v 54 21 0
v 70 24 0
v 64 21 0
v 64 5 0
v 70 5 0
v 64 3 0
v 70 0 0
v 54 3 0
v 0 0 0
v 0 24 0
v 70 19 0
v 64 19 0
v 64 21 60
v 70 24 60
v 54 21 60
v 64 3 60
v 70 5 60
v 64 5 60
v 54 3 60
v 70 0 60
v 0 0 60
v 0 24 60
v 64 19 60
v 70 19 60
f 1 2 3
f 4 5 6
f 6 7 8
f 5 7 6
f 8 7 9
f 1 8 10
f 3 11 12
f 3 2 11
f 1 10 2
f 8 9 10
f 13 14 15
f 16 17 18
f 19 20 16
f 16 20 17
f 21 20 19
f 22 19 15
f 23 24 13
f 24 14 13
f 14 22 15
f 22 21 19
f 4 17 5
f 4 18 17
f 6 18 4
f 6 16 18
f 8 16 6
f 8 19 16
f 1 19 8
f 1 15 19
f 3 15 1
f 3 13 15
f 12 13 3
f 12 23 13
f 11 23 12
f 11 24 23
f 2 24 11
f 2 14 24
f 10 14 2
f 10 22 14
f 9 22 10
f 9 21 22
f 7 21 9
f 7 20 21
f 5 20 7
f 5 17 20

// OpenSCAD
$fn = 32;

// ----------------------------------------------------------------------
// T-slot rail: 70 x 24 mm section, 60 mm long
// ----------------------------------------------------------------------

// --- parameters (mm) ---
profile_height = 60;      // extrusion height
profile_points = 12;      // points of the closed outline

profile = [[0, 0], [70, 0], [70, 5], [64, 5], [64, 3], [54, 3], [54, 21], [64, 21], [64, 19], [70, 19], [70, 24], [0, 24]];  // single closed polygon, 12 points, counter clockwise

// --- the one profile operation ---
linear_extrude(height = profile_height) polygon(points = profile);
